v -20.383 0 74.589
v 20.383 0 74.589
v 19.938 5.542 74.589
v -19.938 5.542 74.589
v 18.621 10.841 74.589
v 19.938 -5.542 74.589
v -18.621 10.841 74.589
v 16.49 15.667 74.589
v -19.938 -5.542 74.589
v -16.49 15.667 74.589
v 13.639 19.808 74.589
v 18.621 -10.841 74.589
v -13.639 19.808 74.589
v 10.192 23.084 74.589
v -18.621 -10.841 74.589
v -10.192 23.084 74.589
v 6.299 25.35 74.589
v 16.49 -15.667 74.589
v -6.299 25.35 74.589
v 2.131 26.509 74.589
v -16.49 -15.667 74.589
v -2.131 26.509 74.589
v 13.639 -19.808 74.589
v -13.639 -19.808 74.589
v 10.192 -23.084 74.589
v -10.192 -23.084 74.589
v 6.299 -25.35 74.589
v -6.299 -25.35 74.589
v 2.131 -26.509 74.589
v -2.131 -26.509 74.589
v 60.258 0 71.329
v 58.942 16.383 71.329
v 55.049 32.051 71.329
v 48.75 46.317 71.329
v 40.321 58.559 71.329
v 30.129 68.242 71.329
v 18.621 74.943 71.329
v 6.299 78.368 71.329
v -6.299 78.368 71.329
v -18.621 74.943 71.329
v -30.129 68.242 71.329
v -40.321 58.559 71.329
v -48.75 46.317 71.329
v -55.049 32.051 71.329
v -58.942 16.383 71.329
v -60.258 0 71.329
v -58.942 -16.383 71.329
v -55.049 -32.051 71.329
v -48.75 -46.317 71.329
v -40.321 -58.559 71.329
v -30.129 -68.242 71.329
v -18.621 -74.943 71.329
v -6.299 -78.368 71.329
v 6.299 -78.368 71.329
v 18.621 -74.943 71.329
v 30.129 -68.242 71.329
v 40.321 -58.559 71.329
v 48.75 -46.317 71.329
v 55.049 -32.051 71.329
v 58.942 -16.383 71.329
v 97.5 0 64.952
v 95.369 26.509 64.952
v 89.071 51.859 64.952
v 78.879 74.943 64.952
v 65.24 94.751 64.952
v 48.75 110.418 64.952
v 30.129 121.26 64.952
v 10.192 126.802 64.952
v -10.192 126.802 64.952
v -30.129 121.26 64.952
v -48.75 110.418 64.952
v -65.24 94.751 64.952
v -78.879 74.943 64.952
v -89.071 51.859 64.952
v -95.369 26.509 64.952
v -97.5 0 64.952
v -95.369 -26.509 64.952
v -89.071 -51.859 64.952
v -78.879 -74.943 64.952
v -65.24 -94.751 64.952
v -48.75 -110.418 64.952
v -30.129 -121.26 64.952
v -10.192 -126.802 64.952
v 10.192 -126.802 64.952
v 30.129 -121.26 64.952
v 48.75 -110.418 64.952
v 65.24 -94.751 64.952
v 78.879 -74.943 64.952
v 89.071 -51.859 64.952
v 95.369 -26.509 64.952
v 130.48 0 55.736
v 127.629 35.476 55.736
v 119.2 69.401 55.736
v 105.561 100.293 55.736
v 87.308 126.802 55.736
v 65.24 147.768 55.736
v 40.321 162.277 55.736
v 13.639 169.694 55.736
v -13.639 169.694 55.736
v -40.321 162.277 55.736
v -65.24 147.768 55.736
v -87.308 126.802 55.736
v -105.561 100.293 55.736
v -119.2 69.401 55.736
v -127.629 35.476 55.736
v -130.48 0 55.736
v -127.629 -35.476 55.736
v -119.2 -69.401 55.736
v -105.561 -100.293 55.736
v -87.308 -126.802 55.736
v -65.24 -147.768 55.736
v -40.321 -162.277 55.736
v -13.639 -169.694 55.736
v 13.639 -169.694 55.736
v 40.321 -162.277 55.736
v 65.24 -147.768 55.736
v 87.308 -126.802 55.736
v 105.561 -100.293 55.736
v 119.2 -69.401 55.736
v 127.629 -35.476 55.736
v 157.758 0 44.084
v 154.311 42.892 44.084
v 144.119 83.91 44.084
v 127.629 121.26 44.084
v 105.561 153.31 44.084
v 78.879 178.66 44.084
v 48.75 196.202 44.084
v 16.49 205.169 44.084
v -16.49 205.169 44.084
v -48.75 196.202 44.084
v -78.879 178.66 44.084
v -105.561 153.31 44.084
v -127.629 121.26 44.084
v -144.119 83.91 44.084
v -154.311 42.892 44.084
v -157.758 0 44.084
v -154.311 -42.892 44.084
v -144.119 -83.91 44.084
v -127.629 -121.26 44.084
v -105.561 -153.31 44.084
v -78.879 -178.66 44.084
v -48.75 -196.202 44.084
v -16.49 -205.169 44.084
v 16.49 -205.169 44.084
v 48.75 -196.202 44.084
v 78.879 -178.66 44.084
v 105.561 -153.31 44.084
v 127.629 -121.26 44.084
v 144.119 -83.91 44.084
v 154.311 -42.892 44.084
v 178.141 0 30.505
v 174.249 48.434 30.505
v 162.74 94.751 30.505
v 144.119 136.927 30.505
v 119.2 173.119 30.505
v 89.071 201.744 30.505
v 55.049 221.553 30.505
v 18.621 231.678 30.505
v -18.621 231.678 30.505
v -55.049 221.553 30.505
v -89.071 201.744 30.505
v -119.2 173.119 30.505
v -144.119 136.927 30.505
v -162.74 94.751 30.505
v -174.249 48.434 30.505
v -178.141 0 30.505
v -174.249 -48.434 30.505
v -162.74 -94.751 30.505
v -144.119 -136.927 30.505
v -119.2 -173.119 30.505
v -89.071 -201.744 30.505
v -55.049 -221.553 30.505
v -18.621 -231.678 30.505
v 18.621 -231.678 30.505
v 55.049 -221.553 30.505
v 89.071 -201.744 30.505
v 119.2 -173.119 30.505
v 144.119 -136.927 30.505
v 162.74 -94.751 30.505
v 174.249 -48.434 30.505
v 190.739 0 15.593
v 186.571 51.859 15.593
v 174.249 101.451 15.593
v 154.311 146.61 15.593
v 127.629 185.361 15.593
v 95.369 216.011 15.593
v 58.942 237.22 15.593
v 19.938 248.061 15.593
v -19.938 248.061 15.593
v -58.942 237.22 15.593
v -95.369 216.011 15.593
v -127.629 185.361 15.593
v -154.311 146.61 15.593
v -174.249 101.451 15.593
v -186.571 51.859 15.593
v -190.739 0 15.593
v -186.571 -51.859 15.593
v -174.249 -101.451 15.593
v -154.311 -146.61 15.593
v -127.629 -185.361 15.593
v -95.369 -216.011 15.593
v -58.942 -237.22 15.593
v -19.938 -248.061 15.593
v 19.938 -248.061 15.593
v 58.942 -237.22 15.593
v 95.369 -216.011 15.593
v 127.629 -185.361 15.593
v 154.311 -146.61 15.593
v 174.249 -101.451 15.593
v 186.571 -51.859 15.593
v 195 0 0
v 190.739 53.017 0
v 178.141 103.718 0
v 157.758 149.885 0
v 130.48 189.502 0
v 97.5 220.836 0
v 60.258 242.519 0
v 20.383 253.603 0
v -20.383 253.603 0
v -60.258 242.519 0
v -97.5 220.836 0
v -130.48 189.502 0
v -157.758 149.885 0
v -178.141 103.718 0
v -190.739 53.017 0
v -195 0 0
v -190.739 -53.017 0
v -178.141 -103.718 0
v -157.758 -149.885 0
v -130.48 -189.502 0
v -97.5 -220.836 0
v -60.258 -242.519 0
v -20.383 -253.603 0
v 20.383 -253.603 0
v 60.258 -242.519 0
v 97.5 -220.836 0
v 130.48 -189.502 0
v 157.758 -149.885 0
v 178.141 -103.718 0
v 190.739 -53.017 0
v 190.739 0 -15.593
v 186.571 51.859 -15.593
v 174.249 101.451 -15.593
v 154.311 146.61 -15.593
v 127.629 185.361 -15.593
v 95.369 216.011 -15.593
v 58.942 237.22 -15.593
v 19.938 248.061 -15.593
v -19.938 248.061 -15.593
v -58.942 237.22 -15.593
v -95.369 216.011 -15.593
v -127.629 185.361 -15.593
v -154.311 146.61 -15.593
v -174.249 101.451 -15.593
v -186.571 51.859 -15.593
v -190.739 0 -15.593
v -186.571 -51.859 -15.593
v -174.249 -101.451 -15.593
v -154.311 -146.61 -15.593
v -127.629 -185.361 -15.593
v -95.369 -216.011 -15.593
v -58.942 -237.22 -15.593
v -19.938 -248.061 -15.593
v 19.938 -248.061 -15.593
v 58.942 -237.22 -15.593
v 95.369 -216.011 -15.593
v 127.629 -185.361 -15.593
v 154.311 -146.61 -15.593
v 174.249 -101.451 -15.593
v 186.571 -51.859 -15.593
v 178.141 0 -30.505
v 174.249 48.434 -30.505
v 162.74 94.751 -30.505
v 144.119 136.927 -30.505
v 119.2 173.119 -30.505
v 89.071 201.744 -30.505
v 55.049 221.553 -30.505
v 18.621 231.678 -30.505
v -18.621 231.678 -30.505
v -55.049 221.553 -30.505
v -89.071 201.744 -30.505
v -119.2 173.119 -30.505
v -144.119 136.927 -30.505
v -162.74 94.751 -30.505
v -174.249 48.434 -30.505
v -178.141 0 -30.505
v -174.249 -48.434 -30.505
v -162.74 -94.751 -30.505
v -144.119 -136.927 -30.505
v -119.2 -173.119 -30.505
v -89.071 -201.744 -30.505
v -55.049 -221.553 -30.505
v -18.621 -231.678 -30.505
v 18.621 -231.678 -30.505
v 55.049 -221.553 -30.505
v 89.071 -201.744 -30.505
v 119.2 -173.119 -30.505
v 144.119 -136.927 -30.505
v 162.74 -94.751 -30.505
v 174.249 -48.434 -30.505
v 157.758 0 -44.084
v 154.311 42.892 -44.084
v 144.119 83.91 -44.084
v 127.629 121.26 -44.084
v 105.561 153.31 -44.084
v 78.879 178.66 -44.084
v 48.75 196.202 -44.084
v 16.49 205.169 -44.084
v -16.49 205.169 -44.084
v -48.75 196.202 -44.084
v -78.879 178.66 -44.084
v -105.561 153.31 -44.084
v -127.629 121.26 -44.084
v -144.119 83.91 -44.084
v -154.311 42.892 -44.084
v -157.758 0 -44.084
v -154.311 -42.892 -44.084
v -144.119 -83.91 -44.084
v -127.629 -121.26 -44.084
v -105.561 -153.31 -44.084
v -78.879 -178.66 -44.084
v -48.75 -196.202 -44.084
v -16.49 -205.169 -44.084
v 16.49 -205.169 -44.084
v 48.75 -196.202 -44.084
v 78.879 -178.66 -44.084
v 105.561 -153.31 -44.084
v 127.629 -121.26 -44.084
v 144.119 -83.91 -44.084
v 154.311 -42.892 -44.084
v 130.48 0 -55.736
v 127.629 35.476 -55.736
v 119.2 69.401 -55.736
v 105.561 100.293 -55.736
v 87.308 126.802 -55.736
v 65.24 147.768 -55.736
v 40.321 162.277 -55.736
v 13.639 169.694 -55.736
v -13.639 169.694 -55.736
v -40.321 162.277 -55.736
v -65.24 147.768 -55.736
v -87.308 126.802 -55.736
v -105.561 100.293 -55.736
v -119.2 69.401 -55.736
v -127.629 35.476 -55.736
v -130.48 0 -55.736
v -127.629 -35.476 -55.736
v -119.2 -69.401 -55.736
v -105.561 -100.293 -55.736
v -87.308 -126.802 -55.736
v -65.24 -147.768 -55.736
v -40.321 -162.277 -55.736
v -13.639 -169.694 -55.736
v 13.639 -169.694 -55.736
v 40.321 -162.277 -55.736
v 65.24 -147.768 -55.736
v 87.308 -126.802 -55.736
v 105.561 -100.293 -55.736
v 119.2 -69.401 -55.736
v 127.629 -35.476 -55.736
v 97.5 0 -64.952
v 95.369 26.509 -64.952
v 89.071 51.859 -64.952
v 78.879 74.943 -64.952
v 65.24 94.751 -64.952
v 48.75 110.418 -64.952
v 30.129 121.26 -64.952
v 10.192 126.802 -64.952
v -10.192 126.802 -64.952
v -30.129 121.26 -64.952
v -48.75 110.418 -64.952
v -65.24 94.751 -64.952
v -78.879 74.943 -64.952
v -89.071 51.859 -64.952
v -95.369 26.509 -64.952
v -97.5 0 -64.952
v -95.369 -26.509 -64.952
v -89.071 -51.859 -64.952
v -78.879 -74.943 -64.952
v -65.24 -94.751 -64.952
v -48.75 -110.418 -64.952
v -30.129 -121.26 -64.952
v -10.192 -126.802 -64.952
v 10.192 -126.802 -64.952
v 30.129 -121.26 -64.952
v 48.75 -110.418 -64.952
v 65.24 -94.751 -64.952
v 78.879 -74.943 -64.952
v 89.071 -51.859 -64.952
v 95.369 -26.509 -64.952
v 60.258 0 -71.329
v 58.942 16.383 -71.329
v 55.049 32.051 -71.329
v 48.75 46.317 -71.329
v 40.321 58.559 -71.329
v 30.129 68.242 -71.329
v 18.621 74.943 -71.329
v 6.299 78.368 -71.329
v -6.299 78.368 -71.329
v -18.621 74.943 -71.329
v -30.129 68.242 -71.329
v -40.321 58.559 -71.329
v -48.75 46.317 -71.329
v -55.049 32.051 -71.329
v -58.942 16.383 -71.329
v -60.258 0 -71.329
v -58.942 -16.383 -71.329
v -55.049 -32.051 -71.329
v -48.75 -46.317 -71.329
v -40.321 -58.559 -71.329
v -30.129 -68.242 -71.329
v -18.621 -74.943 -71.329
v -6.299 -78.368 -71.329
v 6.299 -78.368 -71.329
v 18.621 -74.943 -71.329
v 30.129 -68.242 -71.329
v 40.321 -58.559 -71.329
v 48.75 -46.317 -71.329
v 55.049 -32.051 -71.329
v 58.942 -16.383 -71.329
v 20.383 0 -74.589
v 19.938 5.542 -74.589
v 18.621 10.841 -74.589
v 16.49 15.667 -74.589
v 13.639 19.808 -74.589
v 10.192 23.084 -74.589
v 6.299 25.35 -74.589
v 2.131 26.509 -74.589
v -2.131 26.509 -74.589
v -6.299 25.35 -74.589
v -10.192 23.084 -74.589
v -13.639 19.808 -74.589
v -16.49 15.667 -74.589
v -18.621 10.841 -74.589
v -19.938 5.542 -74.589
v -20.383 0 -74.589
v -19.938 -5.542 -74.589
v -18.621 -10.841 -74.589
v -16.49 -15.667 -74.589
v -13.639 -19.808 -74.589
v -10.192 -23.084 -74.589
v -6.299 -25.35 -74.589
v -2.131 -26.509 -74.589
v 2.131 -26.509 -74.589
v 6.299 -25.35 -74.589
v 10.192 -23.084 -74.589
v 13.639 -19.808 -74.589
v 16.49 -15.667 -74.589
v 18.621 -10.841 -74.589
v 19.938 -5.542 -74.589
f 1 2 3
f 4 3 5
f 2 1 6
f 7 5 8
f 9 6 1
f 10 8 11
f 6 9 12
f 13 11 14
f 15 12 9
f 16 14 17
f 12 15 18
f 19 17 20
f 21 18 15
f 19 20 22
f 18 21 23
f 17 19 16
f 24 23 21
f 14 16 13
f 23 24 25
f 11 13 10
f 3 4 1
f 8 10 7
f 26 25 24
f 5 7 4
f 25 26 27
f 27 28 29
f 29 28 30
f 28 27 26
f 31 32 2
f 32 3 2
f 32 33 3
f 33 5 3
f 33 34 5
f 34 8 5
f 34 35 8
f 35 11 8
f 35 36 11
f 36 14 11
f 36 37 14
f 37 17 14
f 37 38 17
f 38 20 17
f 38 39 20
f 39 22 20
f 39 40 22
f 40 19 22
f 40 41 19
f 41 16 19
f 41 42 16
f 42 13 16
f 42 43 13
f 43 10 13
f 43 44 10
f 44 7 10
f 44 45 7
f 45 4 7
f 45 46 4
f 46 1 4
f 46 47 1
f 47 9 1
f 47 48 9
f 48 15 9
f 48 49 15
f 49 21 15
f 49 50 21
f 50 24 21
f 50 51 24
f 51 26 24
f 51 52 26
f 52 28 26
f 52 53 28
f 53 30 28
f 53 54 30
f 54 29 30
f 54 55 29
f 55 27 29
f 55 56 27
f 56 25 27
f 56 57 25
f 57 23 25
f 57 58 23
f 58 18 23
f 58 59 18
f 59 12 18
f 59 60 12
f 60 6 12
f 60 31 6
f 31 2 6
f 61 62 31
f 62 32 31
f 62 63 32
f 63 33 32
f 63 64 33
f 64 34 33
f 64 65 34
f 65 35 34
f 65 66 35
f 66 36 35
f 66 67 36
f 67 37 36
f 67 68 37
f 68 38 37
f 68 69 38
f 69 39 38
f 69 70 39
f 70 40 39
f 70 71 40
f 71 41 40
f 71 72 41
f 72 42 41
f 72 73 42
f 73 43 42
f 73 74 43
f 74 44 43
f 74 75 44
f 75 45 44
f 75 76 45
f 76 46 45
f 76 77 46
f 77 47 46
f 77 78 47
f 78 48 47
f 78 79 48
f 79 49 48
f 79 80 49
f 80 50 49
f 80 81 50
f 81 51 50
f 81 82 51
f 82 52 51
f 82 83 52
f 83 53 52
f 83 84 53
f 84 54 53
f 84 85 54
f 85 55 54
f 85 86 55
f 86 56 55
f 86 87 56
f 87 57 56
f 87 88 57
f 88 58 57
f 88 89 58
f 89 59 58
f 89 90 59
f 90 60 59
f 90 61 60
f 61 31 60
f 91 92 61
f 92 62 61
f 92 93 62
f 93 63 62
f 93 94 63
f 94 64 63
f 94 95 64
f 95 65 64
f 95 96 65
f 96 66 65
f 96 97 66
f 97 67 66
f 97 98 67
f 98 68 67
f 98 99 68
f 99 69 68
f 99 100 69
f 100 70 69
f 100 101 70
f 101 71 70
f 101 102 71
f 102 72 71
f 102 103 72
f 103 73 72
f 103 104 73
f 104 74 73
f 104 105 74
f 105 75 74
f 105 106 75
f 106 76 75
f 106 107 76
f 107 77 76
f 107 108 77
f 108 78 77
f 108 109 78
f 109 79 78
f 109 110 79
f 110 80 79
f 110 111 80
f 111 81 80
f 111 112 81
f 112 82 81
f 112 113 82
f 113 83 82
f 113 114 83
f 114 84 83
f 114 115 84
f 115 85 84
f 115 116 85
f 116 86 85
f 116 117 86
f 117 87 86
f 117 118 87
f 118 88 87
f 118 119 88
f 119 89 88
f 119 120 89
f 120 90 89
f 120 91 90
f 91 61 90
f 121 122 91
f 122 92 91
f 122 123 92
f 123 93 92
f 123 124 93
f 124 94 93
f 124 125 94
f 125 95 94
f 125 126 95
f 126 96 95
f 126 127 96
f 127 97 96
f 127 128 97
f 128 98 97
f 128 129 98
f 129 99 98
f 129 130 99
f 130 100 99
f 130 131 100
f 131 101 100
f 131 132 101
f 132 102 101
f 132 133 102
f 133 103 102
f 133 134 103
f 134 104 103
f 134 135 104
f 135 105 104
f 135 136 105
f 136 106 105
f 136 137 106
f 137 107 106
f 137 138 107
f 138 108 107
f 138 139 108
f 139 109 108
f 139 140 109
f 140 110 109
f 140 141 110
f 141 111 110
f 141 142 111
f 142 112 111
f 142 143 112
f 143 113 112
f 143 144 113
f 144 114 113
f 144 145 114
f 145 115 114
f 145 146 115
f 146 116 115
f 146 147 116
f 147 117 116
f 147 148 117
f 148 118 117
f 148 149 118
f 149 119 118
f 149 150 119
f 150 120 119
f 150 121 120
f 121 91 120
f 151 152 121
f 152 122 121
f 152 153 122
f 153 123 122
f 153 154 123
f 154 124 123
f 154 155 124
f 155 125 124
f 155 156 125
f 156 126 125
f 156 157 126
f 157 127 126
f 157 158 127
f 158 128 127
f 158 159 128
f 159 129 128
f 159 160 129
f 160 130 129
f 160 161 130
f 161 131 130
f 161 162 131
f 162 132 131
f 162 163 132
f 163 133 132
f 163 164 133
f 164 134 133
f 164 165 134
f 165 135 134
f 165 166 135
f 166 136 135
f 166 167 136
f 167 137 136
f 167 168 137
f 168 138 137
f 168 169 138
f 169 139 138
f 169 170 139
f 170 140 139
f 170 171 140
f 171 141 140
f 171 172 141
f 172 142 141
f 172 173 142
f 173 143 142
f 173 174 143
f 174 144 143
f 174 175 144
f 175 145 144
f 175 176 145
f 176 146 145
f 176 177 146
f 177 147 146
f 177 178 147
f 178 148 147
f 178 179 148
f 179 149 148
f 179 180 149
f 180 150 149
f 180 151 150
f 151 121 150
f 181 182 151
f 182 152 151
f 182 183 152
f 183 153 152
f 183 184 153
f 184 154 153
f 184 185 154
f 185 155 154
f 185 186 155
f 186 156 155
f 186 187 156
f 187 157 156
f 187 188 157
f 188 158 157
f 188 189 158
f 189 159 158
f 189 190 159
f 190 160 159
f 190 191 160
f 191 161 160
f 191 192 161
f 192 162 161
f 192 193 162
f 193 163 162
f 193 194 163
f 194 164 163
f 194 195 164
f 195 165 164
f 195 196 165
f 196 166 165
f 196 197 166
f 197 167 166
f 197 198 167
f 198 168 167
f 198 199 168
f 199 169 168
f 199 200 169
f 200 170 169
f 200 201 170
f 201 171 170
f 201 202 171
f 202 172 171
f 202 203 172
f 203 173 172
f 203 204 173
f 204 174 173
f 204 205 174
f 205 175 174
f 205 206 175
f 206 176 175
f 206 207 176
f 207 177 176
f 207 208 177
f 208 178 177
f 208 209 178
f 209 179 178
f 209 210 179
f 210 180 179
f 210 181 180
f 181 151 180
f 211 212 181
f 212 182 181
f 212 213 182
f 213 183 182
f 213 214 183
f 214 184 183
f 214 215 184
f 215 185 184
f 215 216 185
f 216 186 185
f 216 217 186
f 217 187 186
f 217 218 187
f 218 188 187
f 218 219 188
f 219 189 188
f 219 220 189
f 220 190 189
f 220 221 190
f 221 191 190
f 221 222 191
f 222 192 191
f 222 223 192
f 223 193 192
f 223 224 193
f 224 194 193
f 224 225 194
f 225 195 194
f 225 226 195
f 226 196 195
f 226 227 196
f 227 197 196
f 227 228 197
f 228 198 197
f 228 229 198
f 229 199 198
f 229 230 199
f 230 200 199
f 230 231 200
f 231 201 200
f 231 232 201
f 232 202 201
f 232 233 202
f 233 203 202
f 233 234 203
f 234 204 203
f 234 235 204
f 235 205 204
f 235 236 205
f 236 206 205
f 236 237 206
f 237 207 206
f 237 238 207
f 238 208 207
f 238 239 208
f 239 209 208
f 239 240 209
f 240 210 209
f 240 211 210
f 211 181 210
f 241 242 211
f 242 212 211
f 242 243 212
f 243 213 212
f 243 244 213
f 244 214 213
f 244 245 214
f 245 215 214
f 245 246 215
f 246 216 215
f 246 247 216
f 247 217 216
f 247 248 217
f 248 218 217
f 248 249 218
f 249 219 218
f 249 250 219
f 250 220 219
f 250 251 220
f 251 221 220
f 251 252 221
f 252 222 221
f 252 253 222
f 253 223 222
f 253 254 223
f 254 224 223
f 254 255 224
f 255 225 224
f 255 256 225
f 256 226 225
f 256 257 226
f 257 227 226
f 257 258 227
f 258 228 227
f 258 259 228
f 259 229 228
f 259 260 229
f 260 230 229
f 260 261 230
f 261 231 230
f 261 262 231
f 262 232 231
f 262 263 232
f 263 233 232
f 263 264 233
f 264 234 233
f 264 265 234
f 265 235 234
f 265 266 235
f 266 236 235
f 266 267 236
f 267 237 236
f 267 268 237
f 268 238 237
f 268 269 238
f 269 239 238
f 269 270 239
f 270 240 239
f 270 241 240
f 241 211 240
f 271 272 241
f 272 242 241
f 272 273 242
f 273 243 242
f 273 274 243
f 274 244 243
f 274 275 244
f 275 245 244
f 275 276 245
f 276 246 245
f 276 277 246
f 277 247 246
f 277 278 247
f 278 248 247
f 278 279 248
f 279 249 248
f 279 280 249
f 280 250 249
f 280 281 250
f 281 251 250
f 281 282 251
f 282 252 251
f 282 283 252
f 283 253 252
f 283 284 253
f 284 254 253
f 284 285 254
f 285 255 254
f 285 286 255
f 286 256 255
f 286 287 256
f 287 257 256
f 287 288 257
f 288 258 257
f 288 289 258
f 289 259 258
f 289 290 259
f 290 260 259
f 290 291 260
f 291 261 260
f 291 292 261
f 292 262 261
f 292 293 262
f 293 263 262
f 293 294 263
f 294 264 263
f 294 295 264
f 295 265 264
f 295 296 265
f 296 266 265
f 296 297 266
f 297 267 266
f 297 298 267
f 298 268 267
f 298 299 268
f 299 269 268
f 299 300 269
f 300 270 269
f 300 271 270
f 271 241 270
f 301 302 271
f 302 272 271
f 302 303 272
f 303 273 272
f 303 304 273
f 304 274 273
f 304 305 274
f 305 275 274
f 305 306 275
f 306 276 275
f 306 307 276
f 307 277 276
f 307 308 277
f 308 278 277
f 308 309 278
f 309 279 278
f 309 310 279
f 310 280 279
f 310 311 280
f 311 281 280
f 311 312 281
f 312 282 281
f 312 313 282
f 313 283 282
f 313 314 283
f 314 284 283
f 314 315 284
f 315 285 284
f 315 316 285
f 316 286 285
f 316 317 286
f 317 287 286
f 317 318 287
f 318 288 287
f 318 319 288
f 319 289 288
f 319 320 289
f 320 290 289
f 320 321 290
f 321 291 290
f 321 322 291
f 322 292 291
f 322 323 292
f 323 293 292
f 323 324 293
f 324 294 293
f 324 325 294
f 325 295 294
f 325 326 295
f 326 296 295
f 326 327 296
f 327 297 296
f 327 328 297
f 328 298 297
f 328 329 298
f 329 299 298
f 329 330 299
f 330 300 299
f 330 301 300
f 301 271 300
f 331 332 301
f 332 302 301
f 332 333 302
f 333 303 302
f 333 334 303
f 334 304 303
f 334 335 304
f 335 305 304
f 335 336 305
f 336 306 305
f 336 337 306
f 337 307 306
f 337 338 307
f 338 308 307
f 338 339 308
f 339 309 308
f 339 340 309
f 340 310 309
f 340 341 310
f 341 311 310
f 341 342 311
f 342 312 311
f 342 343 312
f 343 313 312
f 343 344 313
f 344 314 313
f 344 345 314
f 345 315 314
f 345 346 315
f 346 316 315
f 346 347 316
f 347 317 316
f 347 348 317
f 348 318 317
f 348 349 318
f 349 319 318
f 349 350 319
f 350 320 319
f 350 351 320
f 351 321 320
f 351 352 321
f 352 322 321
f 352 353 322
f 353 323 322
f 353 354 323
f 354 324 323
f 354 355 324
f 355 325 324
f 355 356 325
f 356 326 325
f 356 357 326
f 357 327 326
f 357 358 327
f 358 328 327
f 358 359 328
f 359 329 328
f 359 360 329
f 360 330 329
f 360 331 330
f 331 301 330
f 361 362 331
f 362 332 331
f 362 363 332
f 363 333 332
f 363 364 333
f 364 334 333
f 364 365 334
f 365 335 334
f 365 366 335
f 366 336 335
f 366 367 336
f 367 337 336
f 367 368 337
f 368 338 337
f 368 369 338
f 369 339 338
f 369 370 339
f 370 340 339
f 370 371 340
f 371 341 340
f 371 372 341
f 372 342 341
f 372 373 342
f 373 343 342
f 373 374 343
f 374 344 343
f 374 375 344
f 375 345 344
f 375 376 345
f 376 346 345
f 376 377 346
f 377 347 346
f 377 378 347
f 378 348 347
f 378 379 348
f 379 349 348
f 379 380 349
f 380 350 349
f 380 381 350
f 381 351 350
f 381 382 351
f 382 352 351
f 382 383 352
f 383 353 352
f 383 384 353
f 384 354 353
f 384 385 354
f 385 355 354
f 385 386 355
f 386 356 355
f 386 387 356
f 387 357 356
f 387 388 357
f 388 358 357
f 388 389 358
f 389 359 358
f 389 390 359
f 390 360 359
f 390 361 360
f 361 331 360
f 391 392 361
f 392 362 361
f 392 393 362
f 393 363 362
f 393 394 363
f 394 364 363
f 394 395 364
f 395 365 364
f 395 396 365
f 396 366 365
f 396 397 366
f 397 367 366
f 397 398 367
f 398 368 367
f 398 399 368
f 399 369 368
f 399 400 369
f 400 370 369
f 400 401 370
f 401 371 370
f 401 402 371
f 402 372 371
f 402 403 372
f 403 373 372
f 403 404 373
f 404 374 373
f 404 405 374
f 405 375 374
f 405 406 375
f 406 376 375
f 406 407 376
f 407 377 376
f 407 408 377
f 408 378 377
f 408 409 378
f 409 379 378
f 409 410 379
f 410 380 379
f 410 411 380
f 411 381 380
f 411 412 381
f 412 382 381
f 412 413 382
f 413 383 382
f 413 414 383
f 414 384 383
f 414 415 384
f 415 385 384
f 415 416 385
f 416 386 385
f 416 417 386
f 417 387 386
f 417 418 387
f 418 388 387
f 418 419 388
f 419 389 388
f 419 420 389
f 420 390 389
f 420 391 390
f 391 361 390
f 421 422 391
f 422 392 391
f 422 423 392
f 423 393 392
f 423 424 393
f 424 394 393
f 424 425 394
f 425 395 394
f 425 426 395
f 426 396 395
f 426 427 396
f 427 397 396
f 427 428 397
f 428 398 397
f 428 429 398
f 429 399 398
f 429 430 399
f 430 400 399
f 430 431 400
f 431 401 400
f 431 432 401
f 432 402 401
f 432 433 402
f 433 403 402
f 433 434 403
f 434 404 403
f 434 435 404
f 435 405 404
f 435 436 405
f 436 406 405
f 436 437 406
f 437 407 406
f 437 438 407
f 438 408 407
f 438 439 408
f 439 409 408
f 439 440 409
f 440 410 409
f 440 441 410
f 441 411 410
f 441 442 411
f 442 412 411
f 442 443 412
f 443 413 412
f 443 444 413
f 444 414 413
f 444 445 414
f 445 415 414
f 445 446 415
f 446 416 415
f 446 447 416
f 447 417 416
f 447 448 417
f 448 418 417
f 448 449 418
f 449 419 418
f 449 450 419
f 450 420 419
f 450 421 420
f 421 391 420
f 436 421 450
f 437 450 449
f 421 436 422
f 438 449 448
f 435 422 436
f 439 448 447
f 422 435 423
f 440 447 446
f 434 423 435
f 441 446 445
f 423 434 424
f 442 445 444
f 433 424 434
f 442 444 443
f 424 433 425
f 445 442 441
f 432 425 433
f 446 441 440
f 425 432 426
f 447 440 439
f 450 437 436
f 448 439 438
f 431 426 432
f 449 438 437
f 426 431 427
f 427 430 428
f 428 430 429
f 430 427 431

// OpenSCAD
// Generated by SolidPython 1.0.1 on 2020-07-29 00:46:51


scale(v = [13, 17, 5]) {
	sphere(r = 15);
}
/***********************************************
*********      SolidPython code:      **********
************************************************
 
# import packages: SolidPython
from solid import *
from solid.utils import *
from itertools import chain, combinations, permutations


class Resize:

    def __init__(self, scad_file):
        self.scad_file = scad_file
        #self.scad_file = import_scad(scad_file)
        # cone/cylinder param:
        self.r1 = 0
        self.r2 = 0
        self.h = 0
        # rectangular prism param:
        self.w = 0
        self.l = 0
        # ellipse param:
        self.r = 0

    # import OpenScad code (file name corresponds to shape)


    # classify shape + parameters
    def assign(self, param1, param2, param3):
        if self.scad_file == 'cone.scad':
            self.r1 = param1
            self.r2 = param2
            self.h = param3
        elif self.scad_file == 'cylinder.scad':
            self.r1 = param1
            self.r2 = param2
            self.h = param3
        elif self.scad_file == 'rectangularPrism.scad':
            self.h = param1
            self.l = param2
            self.w = param3
        else:
            self.r = param1
            self.h = param2

    # resize parameters
    def iterate(self):
        x = range(3, 20, 2)
        i = 1
        if self.scad_file == 'cone.scad':
            tempList = list(permutations(x, 2))
            for temp in tempList:
                param1 = temp[0]
                param2 = temp[1]
                filepath = 'produced_scad_files/' + 'cone' + str(param1) + '_' + str(param2) + '_' + '.scad'
                scad_render_to_file(cylinder(h=param1, r1=param2, r2=0), filepath)

        elif self.scad_file == 'cylinder.scad':
            tempList = list(permutations(x, 3))
            for temp in tempList:
                param1 = temp[0]
                param2 = temp[1]
                filepath = 'produced_scad_files/' + 'cylinder' + str(param1) + '_' + str(param2) + '_' + '.scad'
                scad_render_to_file(cylinder(h=param1, r1=param2, r2=param2), filepath)

        elif self.scad_file == 'rectangularPrism.scad':
            tempList = list(permutations(x, 3))
            for temp in tempList:
                param1 = temp[0]
                param2 = temp[1]
                param3 = temp[2]
                filepath = 'produced_scad_files/' + 'rectangularPrism' + str(param1) + '_' + str(param2) + '_' + str(
                    param3) + '.scad'
                scad_render_to_file(cube(size=(param1, param2, param3)), filepath)

        elif self.scad_file == 'ellipse.scad':
            tempList = list(permutations(x, 4))
            for temp in tempList:
                param1 = temp[0]
                param2 = temp[1]
                param3 = temp[2]
                param4 = temp[3]
                filepath = 'produced_scad_files/' + 'ellipse' + str(param1) + '_' + str(param2) + '_' + str(param3) + '_' + str(param4) + '.scad'
                scad_render_to_file(scale([param1, param2, param3])(sphere(r=param4)), filepath)

    def render_to_scadfile(self):
        scad_render_to_file(scad, 'example.scad') 
 
************************************************/
